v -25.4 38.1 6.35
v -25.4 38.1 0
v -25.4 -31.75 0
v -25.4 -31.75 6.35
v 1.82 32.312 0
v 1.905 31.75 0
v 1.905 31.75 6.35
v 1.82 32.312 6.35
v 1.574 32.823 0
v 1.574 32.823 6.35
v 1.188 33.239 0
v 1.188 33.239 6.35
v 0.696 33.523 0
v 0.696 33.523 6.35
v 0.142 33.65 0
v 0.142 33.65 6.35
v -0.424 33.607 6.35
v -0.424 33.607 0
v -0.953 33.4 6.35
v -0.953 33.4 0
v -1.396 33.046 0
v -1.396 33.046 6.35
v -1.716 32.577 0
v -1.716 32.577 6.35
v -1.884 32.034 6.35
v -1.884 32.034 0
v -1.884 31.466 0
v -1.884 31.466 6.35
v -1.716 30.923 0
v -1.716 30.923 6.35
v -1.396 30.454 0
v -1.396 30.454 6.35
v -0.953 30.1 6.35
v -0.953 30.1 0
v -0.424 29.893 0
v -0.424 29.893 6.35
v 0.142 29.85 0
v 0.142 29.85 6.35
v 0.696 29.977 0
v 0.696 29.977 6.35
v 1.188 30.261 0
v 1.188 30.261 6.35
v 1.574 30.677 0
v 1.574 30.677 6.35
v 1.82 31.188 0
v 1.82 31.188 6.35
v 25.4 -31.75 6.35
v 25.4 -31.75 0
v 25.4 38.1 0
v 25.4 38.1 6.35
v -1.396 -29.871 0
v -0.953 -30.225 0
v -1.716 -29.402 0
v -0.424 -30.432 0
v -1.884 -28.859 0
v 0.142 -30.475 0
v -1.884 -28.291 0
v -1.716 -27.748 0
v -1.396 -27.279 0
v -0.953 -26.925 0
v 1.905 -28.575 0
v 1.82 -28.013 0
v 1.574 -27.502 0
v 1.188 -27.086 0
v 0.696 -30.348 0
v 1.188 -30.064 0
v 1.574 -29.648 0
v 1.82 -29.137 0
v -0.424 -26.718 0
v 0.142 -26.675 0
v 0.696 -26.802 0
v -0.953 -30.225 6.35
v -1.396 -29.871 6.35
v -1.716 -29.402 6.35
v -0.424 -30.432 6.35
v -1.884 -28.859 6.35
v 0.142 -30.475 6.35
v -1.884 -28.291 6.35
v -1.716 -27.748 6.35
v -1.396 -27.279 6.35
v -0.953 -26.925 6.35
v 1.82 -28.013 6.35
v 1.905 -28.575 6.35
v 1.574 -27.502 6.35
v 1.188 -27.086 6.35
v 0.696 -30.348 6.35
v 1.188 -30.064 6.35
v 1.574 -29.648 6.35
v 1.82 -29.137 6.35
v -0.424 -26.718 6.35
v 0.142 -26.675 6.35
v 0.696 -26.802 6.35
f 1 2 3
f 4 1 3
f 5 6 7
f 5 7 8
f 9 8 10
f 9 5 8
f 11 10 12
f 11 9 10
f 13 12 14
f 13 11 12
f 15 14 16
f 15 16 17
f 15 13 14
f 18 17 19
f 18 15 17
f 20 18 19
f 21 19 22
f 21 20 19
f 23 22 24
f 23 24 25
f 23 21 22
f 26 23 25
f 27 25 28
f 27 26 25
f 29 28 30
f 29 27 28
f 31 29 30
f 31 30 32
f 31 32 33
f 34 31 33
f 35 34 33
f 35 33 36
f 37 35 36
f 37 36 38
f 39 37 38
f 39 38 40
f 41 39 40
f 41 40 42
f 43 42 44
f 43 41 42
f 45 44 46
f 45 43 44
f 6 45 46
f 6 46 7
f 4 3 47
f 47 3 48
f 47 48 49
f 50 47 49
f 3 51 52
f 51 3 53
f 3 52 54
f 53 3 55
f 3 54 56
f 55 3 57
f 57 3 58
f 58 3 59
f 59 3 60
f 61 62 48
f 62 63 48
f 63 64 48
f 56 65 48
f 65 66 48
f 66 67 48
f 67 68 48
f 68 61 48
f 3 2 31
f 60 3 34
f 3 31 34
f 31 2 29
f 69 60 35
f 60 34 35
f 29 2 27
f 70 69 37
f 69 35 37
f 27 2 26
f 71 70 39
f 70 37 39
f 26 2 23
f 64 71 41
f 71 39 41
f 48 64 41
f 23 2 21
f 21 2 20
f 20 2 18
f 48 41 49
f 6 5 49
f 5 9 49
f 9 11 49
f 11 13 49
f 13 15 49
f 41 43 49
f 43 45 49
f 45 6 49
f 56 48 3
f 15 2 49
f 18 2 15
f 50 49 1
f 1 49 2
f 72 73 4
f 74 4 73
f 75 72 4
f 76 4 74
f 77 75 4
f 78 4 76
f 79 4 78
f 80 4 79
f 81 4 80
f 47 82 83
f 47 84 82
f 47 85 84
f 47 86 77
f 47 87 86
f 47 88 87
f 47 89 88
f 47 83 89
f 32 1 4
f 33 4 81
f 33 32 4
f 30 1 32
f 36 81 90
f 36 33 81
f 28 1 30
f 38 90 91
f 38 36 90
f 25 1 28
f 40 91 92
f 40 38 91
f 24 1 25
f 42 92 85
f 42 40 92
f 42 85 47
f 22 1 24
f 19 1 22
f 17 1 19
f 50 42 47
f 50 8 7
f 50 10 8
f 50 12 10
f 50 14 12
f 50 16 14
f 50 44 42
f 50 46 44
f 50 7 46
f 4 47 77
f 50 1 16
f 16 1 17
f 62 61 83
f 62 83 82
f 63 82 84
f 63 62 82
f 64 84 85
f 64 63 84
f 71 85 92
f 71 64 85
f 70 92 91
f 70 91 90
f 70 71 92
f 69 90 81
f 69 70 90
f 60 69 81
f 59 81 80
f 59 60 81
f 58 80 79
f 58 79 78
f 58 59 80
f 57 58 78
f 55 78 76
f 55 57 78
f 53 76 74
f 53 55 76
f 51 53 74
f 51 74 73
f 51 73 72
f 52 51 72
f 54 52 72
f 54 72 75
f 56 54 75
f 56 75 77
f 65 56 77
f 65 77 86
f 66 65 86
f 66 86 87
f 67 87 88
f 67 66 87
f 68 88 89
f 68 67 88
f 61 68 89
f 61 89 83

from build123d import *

# Parameters (mm, degrees)
F0_W     = 50.8
F0_H     = 50.8
F0_R     = 1.905
F0_H_2   = 6.35
F1_DEPTH = 6.35


with BuildPart() as f1:
    # F0 (on Top) → F1 (new body)
    with BuildSketch(Plane.XY):
        Rectangle(F0_W, F0_H)
        Polygon((-25.4, 31.750001), (-25.4, 25.4), (25.4, 25.4), (25.4, 31.750001), (25.4, 38.100001), (14.365858, 38.100001), (-14.365858, 38.100001), (-25.4, 38.100001), align=None)
        with Locations((0, 31.750001)):
            Circle(F0_R, mode=Mode.SUBTRACT)
        with Locations((0, -28.575)):
            Rectangle(F0_W, F0_H_2)
        with Locations((0, -28.575)):
            Circle(F0_R, mode=Mode.SUBTRACT)
    extrude(amount=F1_DEPTH)


solid = f1.part
